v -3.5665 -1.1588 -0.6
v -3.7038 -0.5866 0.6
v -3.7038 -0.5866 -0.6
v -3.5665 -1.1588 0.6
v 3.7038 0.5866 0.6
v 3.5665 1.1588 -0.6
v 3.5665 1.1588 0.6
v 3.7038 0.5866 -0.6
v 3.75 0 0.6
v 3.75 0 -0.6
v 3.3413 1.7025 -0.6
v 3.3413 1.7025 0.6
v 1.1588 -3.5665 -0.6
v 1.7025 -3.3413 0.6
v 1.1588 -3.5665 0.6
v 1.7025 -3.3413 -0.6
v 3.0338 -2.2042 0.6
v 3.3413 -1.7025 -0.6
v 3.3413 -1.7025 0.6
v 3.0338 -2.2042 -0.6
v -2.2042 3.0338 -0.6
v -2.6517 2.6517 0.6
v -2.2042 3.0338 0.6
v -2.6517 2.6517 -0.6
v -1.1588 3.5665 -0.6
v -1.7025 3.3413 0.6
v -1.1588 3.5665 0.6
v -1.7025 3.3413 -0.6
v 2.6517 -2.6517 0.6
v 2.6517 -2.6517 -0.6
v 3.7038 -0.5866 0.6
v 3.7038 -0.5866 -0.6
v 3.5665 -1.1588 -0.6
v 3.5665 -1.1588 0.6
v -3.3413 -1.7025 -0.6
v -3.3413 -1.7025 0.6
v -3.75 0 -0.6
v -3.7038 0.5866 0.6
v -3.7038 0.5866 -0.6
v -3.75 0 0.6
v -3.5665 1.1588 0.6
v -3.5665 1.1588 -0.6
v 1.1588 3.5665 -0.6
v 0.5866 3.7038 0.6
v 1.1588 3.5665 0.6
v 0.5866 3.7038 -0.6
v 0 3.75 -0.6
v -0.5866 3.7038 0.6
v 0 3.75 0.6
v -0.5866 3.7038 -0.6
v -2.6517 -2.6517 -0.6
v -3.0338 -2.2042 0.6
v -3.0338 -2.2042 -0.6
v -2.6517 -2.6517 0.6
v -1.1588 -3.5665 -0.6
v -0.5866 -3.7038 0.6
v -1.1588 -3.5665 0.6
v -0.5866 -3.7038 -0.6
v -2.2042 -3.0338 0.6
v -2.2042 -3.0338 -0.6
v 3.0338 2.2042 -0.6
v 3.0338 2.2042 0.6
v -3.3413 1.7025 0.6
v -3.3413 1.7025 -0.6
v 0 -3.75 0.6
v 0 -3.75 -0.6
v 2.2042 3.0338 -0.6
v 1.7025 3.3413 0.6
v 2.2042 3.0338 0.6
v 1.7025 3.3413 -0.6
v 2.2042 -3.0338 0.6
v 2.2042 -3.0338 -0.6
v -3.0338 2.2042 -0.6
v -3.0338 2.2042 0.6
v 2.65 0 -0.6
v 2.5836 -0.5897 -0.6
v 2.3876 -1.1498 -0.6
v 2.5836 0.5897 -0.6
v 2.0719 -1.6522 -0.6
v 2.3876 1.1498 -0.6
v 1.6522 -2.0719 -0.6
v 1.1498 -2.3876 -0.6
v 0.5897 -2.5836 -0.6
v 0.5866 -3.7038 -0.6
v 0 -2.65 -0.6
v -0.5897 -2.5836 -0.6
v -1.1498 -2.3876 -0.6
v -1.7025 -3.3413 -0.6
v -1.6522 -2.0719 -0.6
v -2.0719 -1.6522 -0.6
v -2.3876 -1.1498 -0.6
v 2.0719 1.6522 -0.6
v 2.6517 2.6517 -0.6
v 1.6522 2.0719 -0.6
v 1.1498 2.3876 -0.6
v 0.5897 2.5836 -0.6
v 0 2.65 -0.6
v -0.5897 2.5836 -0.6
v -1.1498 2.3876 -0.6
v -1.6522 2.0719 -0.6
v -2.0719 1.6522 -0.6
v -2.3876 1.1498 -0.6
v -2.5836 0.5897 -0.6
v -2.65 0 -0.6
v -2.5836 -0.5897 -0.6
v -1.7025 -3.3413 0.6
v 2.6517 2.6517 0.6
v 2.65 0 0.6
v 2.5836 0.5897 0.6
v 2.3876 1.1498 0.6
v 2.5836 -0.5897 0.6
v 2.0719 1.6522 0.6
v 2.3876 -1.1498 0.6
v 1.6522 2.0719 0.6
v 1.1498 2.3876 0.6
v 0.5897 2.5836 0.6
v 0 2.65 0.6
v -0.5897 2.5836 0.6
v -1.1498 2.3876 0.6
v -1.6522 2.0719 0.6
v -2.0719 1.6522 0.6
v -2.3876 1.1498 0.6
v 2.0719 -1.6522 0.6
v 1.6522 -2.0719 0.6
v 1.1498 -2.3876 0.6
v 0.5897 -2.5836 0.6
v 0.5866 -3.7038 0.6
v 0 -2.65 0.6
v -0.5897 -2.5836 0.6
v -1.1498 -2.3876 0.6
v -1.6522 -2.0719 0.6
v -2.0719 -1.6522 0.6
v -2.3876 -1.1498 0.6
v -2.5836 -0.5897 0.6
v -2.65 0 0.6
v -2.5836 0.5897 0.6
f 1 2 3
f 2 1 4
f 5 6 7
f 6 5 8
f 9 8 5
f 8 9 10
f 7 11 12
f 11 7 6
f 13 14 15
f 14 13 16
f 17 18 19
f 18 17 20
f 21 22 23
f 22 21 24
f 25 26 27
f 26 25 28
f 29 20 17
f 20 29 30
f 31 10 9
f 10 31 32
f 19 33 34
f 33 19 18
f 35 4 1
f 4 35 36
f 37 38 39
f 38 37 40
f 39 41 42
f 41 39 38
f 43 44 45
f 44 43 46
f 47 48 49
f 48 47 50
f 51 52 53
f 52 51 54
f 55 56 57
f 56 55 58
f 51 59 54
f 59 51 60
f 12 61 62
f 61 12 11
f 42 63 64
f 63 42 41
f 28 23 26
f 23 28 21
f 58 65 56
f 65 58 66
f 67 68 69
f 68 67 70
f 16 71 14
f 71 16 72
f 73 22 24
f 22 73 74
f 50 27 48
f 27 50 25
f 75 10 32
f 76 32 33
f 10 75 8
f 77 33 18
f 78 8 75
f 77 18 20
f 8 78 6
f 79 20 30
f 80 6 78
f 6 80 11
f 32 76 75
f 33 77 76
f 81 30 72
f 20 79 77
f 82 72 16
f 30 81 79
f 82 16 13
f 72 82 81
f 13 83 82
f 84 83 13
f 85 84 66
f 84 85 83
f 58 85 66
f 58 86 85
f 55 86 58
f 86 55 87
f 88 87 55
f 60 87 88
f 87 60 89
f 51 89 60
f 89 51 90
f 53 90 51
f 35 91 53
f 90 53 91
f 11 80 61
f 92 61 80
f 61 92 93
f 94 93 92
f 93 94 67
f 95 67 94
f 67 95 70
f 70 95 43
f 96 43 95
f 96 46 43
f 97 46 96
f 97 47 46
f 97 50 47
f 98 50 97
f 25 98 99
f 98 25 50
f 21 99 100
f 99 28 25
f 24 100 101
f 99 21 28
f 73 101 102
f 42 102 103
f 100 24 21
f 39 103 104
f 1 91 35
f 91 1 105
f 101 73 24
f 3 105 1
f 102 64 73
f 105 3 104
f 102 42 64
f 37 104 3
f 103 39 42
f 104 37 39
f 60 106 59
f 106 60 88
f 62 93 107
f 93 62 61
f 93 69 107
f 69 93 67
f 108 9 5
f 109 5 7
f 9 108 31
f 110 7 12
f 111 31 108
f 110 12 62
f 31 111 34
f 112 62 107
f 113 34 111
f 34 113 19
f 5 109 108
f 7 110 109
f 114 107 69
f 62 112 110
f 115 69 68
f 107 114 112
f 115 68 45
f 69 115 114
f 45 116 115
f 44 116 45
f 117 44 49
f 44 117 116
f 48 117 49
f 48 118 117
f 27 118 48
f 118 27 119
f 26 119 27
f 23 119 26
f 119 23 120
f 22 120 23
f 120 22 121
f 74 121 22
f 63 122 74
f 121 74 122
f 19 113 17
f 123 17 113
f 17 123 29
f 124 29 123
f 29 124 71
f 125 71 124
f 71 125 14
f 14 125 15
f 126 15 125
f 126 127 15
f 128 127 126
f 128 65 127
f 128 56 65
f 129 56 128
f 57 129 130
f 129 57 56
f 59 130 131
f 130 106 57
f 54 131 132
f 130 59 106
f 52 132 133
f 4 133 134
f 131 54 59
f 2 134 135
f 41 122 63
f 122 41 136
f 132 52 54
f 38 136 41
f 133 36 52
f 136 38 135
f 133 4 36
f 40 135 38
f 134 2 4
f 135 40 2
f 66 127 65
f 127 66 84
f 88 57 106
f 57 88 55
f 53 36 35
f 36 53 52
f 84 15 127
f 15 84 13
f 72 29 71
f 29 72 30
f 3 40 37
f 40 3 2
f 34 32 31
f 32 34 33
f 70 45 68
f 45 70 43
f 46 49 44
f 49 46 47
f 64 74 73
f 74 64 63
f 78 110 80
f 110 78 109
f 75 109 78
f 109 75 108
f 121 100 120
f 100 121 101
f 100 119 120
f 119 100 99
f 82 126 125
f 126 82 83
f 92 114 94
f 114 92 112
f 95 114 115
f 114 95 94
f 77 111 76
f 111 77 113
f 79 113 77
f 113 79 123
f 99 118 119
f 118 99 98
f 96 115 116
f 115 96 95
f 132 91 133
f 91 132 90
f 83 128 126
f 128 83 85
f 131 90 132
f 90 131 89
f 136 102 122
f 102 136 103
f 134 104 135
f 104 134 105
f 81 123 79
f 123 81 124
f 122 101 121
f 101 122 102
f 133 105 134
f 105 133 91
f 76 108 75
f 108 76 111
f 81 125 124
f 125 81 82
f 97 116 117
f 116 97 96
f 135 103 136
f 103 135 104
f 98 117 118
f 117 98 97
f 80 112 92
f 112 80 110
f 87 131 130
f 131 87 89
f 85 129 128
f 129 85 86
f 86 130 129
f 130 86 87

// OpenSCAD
use <common.scad>

// 용어
// 1. 와셔(washer)
// 2. 내경(inner diameter)
// 3. 두께(thickness)
//
// M5 와셔(washer)는 M5 체결부의 내경(inner diameter) 기준으로 모델링합니다.
function washer_m5_t() = 1.2;   // 두께(thickness) (mm)

module washer_m5(part_color = [0.7, 0, 1]) {
    washer(id = 5,
           thickness = washer_m5_t(),
           part_color = part_color);
}

washer_m5();
